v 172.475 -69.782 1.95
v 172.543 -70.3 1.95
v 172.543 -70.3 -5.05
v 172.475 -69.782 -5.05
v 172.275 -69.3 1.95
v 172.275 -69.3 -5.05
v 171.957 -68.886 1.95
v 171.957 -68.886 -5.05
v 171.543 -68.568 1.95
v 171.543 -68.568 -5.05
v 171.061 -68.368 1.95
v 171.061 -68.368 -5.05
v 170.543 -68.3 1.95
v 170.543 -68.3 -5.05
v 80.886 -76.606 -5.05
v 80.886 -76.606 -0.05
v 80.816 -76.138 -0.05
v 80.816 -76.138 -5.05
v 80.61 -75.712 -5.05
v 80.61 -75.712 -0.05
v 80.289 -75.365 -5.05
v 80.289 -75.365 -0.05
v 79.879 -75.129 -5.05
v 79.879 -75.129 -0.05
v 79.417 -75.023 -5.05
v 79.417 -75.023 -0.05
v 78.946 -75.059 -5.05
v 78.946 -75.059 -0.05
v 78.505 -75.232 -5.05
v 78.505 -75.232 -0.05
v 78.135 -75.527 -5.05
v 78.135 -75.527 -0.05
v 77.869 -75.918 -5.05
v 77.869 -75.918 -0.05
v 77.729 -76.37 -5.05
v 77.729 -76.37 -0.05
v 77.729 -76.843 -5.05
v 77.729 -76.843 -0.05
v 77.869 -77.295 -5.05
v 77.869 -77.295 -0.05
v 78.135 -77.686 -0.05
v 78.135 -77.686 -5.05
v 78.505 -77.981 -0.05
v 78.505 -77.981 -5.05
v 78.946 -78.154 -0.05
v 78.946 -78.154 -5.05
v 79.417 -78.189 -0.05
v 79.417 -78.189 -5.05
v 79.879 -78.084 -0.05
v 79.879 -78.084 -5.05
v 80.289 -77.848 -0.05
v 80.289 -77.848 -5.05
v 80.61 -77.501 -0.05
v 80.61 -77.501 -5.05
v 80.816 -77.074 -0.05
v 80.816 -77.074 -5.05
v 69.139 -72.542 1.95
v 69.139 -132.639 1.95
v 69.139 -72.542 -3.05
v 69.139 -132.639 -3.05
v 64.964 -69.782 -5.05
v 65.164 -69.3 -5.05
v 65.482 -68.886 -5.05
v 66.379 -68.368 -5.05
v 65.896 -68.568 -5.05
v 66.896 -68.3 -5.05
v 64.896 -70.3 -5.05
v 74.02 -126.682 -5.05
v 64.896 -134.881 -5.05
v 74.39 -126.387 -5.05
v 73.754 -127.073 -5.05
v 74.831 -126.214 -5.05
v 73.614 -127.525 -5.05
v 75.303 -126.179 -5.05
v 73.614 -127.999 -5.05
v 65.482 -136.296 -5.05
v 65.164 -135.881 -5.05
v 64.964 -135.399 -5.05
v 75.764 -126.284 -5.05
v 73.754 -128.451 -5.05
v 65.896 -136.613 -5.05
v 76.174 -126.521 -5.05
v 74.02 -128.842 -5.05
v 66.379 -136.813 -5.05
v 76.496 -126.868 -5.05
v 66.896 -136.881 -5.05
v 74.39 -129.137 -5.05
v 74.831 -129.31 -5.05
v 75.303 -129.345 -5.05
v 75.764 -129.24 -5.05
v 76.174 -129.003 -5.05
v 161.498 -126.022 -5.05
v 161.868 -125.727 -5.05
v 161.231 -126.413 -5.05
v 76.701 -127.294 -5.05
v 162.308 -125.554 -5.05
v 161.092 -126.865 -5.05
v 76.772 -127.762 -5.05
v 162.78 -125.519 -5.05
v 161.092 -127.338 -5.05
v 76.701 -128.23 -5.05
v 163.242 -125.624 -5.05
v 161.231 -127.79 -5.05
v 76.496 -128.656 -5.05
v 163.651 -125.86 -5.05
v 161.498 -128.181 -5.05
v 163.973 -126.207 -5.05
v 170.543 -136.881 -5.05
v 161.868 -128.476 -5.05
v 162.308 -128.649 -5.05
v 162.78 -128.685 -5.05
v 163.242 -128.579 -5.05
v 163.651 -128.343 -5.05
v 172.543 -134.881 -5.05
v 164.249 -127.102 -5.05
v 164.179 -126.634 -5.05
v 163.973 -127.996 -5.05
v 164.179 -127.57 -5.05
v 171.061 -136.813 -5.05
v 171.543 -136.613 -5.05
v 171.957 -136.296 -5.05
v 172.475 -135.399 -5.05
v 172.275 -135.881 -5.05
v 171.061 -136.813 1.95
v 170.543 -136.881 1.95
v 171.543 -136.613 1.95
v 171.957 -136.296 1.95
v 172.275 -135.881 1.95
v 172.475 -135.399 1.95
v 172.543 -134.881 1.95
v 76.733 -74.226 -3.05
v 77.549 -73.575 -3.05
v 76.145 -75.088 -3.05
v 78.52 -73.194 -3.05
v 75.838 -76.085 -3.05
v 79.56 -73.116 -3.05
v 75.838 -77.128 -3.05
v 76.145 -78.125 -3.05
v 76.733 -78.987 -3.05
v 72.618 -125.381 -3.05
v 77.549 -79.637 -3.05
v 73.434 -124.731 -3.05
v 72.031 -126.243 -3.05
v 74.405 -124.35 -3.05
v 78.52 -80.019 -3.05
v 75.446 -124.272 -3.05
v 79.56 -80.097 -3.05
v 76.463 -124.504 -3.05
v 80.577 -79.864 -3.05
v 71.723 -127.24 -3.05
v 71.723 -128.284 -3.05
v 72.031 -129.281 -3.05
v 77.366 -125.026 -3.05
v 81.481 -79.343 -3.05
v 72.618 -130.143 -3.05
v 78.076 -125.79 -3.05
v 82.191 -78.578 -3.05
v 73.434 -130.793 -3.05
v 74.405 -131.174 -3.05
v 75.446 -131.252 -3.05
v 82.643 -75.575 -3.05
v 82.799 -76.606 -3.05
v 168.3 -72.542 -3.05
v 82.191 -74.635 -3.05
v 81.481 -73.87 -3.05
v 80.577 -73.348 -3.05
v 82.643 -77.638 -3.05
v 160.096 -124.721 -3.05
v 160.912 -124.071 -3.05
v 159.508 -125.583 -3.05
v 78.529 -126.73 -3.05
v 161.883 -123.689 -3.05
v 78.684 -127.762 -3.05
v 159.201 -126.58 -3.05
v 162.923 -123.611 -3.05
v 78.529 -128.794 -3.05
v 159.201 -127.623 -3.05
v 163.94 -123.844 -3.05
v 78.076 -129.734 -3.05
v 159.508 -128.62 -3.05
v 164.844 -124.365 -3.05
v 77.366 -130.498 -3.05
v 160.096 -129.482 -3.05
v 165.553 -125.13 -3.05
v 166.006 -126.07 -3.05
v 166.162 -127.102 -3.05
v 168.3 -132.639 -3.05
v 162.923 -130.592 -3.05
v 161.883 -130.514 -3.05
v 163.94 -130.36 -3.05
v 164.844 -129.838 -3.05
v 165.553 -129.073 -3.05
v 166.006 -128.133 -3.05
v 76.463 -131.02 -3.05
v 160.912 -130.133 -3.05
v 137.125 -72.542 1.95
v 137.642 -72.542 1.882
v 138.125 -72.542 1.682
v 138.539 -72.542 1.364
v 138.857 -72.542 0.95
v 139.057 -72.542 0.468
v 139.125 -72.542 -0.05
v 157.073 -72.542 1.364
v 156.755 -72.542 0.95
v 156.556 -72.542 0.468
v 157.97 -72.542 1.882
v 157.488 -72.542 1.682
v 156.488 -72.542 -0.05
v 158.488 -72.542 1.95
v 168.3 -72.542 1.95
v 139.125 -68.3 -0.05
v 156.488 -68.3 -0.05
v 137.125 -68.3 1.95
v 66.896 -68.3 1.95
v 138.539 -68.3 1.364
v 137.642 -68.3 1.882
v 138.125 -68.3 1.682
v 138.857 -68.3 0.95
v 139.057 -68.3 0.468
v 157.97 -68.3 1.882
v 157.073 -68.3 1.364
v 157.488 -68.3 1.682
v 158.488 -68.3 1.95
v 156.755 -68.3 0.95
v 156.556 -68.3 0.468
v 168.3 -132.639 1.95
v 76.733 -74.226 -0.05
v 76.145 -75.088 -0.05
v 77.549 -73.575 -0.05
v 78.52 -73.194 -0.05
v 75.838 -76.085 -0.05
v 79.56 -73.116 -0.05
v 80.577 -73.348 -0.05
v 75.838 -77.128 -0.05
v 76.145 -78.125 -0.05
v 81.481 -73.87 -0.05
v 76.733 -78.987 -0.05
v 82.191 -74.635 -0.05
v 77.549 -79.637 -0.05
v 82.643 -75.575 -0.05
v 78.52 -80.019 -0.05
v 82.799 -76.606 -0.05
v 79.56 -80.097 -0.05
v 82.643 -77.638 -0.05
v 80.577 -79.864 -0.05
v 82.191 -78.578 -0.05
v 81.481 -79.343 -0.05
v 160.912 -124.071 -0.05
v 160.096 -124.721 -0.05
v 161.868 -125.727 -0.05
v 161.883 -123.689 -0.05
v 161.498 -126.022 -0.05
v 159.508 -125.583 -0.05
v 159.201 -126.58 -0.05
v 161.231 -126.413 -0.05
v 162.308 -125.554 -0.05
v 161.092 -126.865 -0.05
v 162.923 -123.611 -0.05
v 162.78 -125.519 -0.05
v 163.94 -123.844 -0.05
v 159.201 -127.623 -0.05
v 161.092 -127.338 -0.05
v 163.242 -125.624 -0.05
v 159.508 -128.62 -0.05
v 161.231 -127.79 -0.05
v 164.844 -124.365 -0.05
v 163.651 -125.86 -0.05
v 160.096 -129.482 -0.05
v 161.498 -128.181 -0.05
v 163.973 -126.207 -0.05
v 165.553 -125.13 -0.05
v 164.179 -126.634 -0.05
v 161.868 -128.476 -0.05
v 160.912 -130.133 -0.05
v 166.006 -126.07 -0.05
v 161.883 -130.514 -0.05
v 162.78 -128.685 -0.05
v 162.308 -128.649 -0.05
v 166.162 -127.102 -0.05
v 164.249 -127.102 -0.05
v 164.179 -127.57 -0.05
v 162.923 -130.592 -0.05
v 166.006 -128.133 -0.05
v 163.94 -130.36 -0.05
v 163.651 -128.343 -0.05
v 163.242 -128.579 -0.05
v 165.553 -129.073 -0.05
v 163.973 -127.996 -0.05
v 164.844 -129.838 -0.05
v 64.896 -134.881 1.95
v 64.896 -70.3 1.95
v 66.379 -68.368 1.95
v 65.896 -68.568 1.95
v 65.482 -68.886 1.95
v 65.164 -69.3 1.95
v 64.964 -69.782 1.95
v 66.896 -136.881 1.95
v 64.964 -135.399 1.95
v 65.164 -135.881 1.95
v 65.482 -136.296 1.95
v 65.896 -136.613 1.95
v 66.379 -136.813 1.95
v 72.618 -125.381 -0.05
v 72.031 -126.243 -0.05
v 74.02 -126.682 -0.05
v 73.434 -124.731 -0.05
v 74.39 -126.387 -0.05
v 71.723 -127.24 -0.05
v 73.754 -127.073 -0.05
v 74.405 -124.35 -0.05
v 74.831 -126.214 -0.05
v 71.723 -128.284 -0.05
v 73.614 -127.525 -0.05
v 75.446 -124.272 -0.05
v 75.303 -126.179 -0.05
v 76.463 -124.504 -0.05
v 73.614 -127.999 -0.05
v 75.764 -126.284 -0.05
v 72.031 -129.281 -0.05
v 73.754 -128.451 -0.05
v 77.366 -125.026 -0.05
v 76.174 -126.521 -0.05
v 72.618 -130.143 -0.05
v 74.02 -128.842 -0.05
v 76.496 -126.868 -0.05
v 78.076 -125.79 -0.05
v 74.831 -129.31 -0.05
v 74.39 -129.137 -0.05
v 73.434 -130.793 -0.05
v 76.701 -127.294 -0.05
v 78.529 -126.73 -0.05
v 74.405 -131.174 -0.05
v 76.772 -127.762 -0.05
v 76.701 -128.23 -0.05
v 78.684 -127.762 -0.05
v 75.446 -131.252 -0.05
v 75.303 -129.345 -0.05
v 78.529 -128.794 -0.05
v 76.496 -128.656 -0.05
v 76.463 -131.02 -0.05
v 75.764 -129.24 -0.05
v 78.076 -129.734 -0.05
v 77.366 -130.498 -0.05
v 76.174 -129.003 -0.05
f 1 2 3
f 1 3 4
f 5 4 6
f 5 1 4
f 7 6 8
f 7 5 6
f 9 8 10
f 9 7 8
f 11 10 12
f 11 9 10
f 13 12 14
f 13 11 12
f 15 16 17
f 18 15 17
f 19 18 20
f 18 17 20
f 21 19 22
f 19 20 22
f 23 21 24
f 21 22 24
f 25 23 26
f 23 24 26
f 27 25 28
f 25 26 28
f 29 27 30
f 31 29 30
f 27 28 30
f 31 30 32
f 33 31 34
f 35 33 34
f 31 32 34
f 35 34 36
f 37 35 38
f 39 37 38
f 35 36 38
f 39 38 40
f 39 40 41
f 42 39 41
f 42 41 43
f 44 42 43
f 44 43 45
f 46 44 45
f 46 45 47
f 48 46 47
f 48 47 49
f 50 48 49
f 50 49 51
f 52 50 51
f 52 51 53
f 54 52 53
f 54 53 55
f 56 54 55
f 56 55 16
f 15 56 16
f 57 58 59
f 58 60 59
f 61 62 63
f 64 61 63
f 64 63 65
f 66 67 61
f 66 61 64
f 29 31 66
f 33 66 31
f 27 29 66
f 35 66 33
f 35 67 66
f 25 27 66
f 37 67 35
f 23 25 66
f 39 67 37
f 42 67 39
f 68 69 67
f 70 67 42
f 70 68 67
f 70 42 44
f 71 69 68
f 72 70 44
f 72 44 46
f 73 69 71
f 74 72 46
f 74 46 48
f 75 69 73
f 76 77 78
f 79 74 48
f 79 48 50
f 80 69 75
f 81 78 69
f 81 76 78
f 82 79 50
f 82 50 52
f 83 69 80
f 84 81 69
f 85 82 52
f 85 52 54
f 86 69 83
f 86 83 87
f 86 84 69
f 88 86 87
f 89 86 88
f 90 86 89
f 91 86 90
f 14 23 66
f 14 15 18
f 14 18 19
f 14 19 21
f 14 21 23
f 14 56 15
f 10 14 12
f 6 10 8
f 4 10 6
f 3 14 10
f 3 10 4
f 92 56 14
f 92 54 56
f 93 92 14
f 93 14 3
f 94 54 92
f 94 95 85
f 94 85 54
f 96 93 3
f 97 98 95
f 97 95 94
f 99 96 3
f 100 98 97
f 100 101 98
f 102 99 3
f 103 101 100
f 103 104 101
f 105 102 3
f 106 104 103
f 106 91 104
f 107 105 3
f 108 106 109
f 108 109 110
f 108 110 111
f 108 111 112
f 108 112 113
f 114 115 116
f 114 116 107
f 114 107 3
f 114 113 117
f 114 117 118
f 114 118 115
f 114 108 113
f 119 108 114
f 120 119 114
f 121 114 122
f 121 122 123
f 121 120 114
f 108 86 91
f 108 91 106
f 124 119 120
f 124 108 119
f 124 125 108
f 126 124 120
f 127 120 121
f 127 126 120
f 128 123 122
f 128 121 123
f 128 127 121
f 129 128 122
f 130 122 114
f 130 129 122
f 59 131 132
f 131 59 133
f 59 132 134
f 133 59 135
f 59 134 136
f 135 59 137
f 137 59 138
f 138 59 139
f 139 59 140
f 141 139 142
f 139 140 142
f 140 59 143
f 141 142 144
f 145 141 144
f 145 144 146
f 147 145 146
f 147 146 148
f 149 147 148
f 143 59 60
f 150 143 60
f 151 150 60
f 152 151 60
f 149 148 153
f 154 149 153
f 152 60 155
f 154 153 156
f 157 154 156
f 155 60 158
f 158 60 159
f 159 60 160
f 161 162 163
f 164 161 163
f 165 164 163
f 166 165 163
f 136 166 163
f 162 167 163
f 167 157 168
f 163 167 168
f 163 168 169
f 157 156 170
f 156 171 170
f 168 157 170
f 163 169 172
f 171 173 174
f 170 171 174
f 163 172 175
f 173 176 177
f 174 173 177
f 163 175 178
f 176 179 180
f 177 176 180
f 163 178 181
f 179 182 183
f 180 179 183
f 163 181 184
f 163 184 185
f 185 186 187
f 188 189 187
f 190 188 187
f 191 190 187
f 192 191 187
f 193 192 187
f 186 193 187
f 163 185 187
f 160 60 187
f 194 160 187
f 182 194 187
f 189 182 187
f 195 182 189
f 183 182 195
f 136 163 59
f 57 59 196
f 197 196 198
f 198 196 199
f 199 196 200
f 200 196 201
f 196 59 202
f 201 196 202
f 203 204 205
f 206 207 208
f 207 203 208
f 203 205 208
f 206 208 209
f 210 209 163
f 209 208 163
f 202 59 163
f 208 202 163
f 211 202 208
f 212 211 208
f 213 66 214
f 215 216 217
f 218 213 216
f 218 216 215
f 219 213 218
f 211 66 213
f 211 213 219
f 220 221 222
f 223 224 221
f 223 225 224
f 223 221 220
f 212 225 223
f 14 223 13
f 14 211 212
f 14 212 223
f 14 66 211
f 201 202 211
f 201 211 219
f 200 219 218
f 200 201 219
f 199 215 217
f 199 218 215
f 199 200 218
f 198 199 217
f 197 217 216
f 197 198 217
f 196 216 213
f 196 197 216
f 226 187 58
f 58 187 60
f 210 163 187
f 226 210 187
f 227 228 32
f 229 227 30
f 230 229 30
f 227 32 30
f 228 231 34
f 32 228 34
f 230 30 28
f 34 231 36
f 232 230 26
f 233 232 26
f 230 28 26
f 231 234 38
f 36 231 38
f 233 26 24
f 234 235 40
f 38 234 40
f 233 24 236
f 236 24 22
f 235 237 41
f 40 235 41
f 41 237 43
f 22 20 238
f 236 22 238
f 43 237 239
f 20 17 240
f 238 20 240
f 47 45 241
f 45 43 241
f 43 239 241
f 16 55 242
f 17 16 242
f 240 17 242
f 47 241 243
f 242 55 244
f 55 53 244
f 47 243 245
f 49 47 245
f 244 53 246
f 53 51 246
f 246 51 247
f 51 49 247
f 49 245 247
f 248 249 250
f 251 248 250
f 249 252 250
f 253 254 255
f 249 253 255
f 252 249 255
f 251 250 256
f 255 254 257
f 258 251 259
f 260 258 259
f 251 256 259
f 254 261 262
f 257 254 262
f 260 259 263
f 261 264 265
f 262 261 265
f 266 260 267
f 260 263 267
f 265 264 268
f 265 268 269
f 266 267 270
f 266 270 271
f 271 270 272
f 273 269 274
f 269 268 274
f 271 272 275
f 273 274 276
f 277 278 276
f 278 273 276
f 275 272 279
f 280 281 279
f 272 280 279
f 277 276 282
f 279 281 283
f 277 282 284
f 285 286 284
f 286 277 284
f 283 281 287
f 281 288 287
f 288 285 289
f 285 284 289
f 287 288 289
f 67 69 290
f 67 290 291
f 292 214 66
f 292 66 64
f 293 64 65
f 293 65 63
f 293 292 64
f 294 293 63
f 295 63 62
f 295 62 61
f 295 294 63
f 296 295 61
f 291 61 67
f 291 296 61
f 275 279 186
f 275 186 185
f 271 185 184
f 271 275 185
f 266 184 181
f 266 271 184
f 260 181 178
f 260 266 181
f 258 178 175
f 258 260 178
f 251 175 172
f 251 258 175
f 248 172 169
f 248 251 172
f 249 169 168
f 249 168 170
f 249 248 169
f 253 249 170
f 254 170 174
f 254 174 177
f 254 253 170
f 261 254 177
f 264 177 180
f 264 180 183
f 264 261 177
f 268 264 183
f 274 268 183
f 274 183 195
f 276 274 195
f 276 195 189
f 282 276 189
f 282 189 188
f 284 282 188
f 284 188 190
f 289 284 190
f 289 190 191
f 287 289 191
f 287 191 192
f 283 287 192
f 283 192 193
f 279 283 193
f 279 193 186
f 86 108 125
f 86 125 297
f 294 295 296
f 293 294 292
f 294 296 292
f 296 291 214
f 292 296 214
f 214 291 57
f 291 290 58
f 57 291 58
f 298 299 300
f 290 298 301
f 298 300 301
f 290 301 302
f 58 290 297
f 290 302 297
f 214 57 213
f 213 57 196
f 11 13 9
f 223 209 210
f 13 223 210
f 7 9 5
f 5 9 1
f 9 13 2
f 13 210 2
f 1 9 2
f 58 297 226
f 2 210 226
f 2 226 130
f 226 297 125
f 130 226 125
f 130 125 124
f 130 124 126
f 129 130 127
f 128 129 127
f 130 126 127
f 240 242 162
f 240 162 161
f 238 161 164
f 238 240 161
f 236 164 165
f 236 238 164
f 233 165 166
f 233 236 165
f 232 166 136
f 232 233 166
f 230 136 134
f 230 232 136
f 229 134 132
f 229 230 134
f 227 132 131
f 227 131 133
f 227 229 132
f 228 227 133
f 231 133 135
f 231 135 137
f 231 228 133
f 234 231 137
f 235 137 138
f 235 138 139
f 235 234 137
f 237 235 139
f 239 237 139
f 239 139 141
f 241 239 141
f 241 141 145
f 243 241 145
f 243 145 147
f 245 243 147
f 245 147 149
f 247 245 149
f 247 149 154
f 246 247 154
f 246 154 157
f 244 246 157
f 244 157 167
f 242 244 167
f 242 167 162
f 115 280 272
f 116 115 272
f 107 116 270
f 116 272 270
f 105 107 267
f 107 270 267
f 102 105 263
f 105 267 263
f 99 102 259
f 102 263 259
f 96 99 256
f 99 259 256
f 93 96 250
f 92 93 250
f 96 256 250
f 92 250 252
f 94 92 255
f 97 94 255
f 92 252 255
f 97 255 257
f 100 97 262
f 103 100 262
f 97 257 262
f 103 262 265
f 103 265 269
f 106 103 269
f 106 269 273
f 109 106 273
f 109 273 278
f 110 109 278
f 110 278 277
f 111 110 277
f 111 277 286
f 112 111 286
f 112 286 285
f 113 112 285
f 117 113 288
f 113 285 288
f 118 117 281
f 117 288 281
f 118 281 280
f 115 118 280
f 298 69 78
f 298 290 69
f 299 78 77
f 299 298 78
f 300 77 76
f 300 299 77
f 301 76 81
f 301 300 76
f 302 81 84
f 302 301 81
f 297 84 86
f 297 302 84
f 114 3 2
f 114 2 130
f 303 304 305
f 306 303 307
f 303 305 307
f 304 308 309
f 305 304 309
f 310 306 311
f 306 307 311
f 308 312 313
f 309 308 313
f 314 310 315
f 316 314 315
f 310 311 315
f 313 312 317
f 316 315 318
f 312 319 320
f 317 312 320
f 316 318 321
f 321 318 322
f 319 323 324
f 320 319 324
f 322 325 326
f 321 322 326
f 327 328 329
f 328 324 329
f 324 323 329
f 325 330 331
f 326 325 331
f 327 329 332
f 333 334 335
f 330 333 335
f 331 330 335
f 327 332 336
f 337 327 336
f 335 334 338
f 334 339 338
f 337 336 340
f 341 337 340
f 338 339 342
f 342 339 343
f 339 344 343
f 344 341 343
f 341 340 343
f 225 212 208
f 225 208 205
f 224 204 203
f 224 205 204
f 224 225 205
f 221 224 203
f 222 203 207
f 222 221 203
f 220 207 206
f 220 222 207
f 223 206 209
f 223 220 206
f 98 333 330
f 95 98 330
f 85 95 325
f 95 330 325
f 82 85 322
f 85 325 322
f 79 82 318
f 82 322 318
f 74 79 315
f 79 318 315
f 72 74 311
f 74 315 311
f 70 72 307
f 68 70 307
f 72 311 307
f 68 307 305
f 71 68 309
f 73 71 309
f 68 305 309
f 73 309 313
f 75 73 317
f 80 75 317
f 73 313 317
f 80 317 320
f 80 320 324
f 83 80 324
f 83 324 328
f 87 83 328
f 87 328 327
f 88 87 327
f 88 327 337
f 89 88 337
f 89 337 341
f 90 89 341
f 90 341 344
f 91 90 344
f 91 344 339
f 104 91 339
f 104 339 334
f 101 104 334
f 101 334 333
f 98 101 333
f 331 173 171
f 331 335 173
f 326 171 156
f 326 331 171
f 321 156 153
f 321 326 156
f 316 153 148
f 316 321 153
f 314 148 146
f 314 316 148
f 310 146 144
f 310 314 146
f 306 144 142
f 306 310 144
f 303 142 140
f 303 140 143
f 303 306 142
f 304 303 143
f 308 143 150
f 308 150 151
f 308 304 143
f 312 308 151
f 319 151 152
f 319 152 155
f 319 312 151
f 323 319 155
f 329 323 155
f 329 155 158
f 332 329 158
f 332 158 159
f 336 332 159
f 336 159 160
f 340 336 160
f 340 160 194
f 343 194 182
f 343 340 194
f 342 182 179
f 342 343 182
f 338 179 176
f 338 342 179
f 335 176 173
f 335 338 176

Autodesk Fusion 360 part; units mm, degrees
sketch "Sketch1" plane through (0, 0, -0.05) normal (0, 0, -1) x (1, 0, 0)
  line L0 (69.1388, 132.6388) -> (69.1388, 72.5424)
  line L1 (69.1388, 72.5424) -> (168.3004, 72.5424)
  line L2 (168.3004, 72.5424) -> (168.3004, 132.6388)
  line L3 (168.3004, 132.6388) -> (69.1388, 132.6388)
  circle A0 centre (75.184, 127.762) radius 1.5875
  circle A1 centre (162.6616, 127.1016) radius 1.5875
  circle A2 centre (105.5624, 117.7544) radius 1.9875
  circle A3 centre (100.4824, 117.7544) radius 0.8374
  circle A4 centre (110.6424, 117.7544) radius 0.8374
  circle A5 centre (101.7524, 115.2144) radius 0.7374
  circle A6 centre (137.5664, 111.8616) radius 1.9875
  circle A7 centre (156.6164, 111.8616) radius 1.9875
  circle A8 centre (108.1024, 112.6744) radius 0.7374
  circle A9 centre (132.4864, 111.8616) radius 0.8374
  circle A10 centre (142.6464, 111.8616) radius 0.8374
  circle A11 centre (151.5364, 111.8616) radius 0.8374
  circle A12 centre (161.6964, 111.8616) radius 0.8374
  circle A13 centre (141.3764, 109.3216) radius 0.7374
  circle A14 centre (160.4264, 109.3216) radius 0.7374
  circle A15 centre (79.5528, 106.9848) radius 1.9875
  circle A16 centre (74.4728, 106.9848) radius 0.8374
  circle A17 centre (84.6328, 106.9848) radius 0.8374
  circle A18 centre (135.0264, 106.7816) radius 0.7374
  circle A19 centre (154.0764, 106.7816) radius 0.7374
  circle A20 centre (75.7428, 104.4448) radius 0.7374
  circle A21 centre (82.0928, 101.9048) radius 0.7374
  circle A22 centre (140.0556, 90.7861) radius 0.4319
  circle A23 centre (155.2956, 90.7861) radius 0.4319
  circle A24 centre (140.0556, 88.2461) radius 0.4319
  circle A25 centre (155.2956, 88.2461) radius 0.4319
  circle A26 centre (101.8032, 85.8012) radius 1.9875
  circle A27 centre (120.8532, 85.8012) radius 1.9875
  circle A28 centre (96.7232, 85.8012) radius 0.8374
  circle A29 centre (106.8832, 85.8012) radius 0.8374
  circle A30 centre (115.7732, 85.8012) radius 0.8374
  circle A31 centre (125.9332, 85.8012) radius 0.8374
  circle A32 centre (140.0556, 85.7061) radius 0.4319
  circle A33 centre (155.2956, 85.7061) radius 0.4319
  circle A34 centre (97.9932, 83.2612) radius 0.7374
  circle A35 centre (117.0432, 83.2612) radius 0.7374
  circle A36 centre (140.0556, 83.1661) radius 0.4319
  circle A37 centre (155.2956, 83.1661) radius 0.4319
  circle A38 centre (104.3432, 80.7212) radius 0.7374
  circle A39 centre (123.3932, 80.7212) radius 0.7374
  circle A40 centre (140.0556, 80.6261) radius 0.4319
  circle A41 centre (155.2956, 80.6261) radius 0.4319
  circle A42 centre (140.0556, 78.0861) radius 0.4319
  circle A43 centre (155.2956, 78.0861) radius 0.4319
  circle A44 centre (79.2988, 76.6064) radius 1.5875
  circle A45 centre (140.0556, 75.5461) radius 0.4319
  circle A46 centre (155.2956, 75.5461) radius 0.4319
  circle A47 centre (75.184, 127.762) radius 1.5875
  circle A48 centre (79.2988, 76.6064) radius 1.5875
  circle A49 centre (162.6616, 127.1016) radius 1.5875
  circle A50 centre (162.6616, 127.1016) radius 3.5
  circle A51 centre (79.2988, 76.6064) radius 3.5
  circle A52 centre (75.184, 127.762) radius 3.5
  dimension "d1" = 7
  dimension "d2" = 7
  dimension "d3" = 7
extrude "Extrude1" add sketch "Sketch1" along normal blind 5 contours A50 | A51 | A52 makes body 1 at (72.8681, -125.1378, -3.3833) makes body 2 at (82.7944, -76.4319, -3.3833) makes body 3 at (165.4516, -129.2149, -3.3833)
sketch "Sketch2" plane through (0, 0, -0.05) normal (0, 0, -1) x (1, 0, 0)
sketch "Sketch3" plane through (0, 0, -5.05) normal (0, 0, -1) x (1, 0, 0)
  circle A0 centre (75.184, 127.762) radius 1.5875
  circle A1 centre (75.184, 127.762) radius 3.5
  line L0 (69.1388, 132.6388) -> (69.1388, 72.5424)
  line L1 (69.1388, 72.5424) -> (168.3004, 72.5424)
  line L2 (168.3004, 72.5424) -> (168.3004, 132.6388)
  line L3 (168.3004, 132.6388) -> (69.1388, 132.6388)
  circle A2 centre (75.184, 127.762) radius 1.5875
  circle A3 centre (162.6616, 127.1016) radius 1.5875
  circle A4 centre (105.5624, 117.7544) radius 1.9875
  circle A5 centre (100.4824, 117.7544) radius 0.8374
  circle A6 centre (110.6424, 117.7544) radius 0.8374
  circle A7 centre (101.7524, 115.2144) radius 0.7374
  circle A8 centre (137.5664, 111.8616) radius 1.9875
  circle A9 centre (156.6164, 111.8616) radius 1.9875
  circle A10 centre (108.1024, 112.6744) radius 0.7374
  circle A11 centre (132.4864, 111.8616) radius 0.8374
  circle A12 centre (142.6464, 111.8616) radius 0.8374
  circle A13 centre (151.5364, 111.8616) radius 0.8374
  circle A14 centre (161.6964, 111.8616) radius 0.8374
  circle A15 centre (141.3764, 109.3216) radius 0.7374
  circle A16 centre (160.4264, 109.3216) radius 0.7374
  circle A17 centre (79.5528, 106.9848) radius 1.9875
  circle A18 centre (74.4728, 106.9848) radius 0.8374
  circle A19 centre (84.6328, 106.9848) radius 0.8374
  circle A20 centre (135.0264, 106.7816) radius 0.7374
  circle A21 centre (154.0764, 106.7816) radius 0.7374
  circle A22 centre (75.7428, 104.4448) radius 0.7374
  circle A23 centre (82.0928, 101.9048) radius 0.7374
  circle A24 centre (140.0556, 90.7861) radius 0.4319
  circle A25 centre (155.2956, 90.7861) radius 0.4319
  circle A26 centre (140.0556, 88.2461) radius 0.4319
  circle A27 centre (155.2956, 88.2461) radius 0.4319
  circle A28 centre (101.8032, 85.8012) radius 1.9875
  circle A29 centre (120.8532, 85.8012) radius 1.9875
  circle A30 centre (96.7232, 85.8012) radius 0.8374
  circle A31 centre (106.8832, 85.8012) radius 0.8374
  circle A32 centre (115.7732, 85.8012) radius 0.8374
  circle A33 centre (125.9332, 85.8012) radius 0.8374
  circle A34 centre (140.0556, 85.7061) radius 0.4319
  circle A35 centre (155.2956, 85.7061) radius 0.4319
  circle A36 centre (97.9932, 83.2612) radius 0.7374
  circle A37 centre (117.0432, 83.2612) radius 0.7374
  circle A38 centre (140.0556, 83.1661) radius 0.4319
  circle A39 centre (155.2956, 83.1661) radius 0.4319
  circle A40 centre (104.3432, 80.7212) radius 0.7374
  circle A41 centre (123.3932, 80.7212) radius 0.7374
  circle A42 centre (140.0556, 80.6261) radius 0.4319
  circle A43 centre (155.2956, 80.6261) radius 0.4319
  circle A44 centre (140.0556, 78.0861) radius 0.4319
  circle A45 centre (155.2956, 78.0861) radius 0.4319
  circle A46 centre (79.2988, 76.6064) radius 1.5875
  circle A47 centre (140.0556, 75.5461) radius 0.4319
  circle A48 centre (155.2956, 75.5461) radius 0.4319
  line L4 (118.7196, 132.6388) -> (118.7196, 72.5424)
  line L5 (118.7196, 102.5906) -> (168.3004, 102.5906)
  line L6 (69.1388, 72.5424) -> (64.8962, 68.2998)
  line L7 (168.3004, 132.6388) -> (172.543, 136.8814)
  line L8 (168.3004, 132.6388) -> (174.3004, 132.6388) construction
  line L9 (64.8962, 68.2998) -> (172.543, 68.2998)
  line L10 (172.543, 68.2998) -> (172.543, 136.8814)
  line L11 (172.543, 136.8814) -> (64.8962, 136.8814)
  line L12 (64.8962, 136.8814) -> (64.8962, 68.2998)
  line L13 (69.1388, 72.5424) -> (168.3004, 72.5424)
  line L14 (168.3004, 72.5424) -> (168.3004, 132.6388)
  line L15 (168.3004, 132.6388) -> (69.1388, 132.6388)
  line L16 (69.1388, 132.6388) -> (69.1388, 72.5424)
  line L17 (139.1248, 68.2998) -> (139.1248, 72.5424)
  line L18 (156.4875, 72.5424) -> (156.4875, 68.2998)
  dimension "d6" = 6
  dimension "d7" = 45
  dimension "d8" = 45
  dimension "d9" = 6
extrude "Extrude2" add sketch "Sketch3" against normal blind 7 separate body contours L0 L3 L6 L7 L11 L12 L15 L16 | L1 L6 L9 L13 L17 | L1 L2 L7 L9 L10 L13 L14 L18 makes body 4
sketch "Sketch4" plane through (0, 0, -5.05) normal (0, 0, -1) x (1, 0, 0)
  line L0 (168.3004, 132.6388) -> (69.1388, 132.6388)
  line L1 (69.1388, 132.6388) -> (69.1388, 72.5424)
  line L2 (69.1388, 72.5424) -> (168.3004, 72.5424)
  line L3 (168.3004, 72.5424) -> (168.3004, 132.6388)
  point P0 (69.1388, 72.5424)
  point P1 (168.3004, 132.6388)
extrude "Extrude3" add sketch "Sketch4" sketch "Sketch3" against normal blind 2 of sketch 2 contours A3 bodies 1 2 3 4
extrude "Extrude4" add sketch "Sketch3" against normal blind 2 contours L1 L9 L13 L17 L18 bodies 1
extrude "Extrude5" cut sketch "Sketch1" along normal mid plane 200 contours A0 A47 | A1 A49 | A44 A48 bodies 1
fillet "Fillet1" radius 2 2 edges at (156.4875, -70.4211, 1.95) (139.1248, -70.4211, 1.95) on bodies 1
fillet "Fillet2" radius 2 4 edges at (172.543, -68.2998, -1.55) (172.543, -136.8814, -1.55) (64.8962, -136.8814, -1.55) (64.8962, -68.2998, -1.55) on bodies 1
extrude "Extrude6" add sketch "Sketch3" against normal blind 5 contours L1 L9 L13 L17 L18 bodies 1
